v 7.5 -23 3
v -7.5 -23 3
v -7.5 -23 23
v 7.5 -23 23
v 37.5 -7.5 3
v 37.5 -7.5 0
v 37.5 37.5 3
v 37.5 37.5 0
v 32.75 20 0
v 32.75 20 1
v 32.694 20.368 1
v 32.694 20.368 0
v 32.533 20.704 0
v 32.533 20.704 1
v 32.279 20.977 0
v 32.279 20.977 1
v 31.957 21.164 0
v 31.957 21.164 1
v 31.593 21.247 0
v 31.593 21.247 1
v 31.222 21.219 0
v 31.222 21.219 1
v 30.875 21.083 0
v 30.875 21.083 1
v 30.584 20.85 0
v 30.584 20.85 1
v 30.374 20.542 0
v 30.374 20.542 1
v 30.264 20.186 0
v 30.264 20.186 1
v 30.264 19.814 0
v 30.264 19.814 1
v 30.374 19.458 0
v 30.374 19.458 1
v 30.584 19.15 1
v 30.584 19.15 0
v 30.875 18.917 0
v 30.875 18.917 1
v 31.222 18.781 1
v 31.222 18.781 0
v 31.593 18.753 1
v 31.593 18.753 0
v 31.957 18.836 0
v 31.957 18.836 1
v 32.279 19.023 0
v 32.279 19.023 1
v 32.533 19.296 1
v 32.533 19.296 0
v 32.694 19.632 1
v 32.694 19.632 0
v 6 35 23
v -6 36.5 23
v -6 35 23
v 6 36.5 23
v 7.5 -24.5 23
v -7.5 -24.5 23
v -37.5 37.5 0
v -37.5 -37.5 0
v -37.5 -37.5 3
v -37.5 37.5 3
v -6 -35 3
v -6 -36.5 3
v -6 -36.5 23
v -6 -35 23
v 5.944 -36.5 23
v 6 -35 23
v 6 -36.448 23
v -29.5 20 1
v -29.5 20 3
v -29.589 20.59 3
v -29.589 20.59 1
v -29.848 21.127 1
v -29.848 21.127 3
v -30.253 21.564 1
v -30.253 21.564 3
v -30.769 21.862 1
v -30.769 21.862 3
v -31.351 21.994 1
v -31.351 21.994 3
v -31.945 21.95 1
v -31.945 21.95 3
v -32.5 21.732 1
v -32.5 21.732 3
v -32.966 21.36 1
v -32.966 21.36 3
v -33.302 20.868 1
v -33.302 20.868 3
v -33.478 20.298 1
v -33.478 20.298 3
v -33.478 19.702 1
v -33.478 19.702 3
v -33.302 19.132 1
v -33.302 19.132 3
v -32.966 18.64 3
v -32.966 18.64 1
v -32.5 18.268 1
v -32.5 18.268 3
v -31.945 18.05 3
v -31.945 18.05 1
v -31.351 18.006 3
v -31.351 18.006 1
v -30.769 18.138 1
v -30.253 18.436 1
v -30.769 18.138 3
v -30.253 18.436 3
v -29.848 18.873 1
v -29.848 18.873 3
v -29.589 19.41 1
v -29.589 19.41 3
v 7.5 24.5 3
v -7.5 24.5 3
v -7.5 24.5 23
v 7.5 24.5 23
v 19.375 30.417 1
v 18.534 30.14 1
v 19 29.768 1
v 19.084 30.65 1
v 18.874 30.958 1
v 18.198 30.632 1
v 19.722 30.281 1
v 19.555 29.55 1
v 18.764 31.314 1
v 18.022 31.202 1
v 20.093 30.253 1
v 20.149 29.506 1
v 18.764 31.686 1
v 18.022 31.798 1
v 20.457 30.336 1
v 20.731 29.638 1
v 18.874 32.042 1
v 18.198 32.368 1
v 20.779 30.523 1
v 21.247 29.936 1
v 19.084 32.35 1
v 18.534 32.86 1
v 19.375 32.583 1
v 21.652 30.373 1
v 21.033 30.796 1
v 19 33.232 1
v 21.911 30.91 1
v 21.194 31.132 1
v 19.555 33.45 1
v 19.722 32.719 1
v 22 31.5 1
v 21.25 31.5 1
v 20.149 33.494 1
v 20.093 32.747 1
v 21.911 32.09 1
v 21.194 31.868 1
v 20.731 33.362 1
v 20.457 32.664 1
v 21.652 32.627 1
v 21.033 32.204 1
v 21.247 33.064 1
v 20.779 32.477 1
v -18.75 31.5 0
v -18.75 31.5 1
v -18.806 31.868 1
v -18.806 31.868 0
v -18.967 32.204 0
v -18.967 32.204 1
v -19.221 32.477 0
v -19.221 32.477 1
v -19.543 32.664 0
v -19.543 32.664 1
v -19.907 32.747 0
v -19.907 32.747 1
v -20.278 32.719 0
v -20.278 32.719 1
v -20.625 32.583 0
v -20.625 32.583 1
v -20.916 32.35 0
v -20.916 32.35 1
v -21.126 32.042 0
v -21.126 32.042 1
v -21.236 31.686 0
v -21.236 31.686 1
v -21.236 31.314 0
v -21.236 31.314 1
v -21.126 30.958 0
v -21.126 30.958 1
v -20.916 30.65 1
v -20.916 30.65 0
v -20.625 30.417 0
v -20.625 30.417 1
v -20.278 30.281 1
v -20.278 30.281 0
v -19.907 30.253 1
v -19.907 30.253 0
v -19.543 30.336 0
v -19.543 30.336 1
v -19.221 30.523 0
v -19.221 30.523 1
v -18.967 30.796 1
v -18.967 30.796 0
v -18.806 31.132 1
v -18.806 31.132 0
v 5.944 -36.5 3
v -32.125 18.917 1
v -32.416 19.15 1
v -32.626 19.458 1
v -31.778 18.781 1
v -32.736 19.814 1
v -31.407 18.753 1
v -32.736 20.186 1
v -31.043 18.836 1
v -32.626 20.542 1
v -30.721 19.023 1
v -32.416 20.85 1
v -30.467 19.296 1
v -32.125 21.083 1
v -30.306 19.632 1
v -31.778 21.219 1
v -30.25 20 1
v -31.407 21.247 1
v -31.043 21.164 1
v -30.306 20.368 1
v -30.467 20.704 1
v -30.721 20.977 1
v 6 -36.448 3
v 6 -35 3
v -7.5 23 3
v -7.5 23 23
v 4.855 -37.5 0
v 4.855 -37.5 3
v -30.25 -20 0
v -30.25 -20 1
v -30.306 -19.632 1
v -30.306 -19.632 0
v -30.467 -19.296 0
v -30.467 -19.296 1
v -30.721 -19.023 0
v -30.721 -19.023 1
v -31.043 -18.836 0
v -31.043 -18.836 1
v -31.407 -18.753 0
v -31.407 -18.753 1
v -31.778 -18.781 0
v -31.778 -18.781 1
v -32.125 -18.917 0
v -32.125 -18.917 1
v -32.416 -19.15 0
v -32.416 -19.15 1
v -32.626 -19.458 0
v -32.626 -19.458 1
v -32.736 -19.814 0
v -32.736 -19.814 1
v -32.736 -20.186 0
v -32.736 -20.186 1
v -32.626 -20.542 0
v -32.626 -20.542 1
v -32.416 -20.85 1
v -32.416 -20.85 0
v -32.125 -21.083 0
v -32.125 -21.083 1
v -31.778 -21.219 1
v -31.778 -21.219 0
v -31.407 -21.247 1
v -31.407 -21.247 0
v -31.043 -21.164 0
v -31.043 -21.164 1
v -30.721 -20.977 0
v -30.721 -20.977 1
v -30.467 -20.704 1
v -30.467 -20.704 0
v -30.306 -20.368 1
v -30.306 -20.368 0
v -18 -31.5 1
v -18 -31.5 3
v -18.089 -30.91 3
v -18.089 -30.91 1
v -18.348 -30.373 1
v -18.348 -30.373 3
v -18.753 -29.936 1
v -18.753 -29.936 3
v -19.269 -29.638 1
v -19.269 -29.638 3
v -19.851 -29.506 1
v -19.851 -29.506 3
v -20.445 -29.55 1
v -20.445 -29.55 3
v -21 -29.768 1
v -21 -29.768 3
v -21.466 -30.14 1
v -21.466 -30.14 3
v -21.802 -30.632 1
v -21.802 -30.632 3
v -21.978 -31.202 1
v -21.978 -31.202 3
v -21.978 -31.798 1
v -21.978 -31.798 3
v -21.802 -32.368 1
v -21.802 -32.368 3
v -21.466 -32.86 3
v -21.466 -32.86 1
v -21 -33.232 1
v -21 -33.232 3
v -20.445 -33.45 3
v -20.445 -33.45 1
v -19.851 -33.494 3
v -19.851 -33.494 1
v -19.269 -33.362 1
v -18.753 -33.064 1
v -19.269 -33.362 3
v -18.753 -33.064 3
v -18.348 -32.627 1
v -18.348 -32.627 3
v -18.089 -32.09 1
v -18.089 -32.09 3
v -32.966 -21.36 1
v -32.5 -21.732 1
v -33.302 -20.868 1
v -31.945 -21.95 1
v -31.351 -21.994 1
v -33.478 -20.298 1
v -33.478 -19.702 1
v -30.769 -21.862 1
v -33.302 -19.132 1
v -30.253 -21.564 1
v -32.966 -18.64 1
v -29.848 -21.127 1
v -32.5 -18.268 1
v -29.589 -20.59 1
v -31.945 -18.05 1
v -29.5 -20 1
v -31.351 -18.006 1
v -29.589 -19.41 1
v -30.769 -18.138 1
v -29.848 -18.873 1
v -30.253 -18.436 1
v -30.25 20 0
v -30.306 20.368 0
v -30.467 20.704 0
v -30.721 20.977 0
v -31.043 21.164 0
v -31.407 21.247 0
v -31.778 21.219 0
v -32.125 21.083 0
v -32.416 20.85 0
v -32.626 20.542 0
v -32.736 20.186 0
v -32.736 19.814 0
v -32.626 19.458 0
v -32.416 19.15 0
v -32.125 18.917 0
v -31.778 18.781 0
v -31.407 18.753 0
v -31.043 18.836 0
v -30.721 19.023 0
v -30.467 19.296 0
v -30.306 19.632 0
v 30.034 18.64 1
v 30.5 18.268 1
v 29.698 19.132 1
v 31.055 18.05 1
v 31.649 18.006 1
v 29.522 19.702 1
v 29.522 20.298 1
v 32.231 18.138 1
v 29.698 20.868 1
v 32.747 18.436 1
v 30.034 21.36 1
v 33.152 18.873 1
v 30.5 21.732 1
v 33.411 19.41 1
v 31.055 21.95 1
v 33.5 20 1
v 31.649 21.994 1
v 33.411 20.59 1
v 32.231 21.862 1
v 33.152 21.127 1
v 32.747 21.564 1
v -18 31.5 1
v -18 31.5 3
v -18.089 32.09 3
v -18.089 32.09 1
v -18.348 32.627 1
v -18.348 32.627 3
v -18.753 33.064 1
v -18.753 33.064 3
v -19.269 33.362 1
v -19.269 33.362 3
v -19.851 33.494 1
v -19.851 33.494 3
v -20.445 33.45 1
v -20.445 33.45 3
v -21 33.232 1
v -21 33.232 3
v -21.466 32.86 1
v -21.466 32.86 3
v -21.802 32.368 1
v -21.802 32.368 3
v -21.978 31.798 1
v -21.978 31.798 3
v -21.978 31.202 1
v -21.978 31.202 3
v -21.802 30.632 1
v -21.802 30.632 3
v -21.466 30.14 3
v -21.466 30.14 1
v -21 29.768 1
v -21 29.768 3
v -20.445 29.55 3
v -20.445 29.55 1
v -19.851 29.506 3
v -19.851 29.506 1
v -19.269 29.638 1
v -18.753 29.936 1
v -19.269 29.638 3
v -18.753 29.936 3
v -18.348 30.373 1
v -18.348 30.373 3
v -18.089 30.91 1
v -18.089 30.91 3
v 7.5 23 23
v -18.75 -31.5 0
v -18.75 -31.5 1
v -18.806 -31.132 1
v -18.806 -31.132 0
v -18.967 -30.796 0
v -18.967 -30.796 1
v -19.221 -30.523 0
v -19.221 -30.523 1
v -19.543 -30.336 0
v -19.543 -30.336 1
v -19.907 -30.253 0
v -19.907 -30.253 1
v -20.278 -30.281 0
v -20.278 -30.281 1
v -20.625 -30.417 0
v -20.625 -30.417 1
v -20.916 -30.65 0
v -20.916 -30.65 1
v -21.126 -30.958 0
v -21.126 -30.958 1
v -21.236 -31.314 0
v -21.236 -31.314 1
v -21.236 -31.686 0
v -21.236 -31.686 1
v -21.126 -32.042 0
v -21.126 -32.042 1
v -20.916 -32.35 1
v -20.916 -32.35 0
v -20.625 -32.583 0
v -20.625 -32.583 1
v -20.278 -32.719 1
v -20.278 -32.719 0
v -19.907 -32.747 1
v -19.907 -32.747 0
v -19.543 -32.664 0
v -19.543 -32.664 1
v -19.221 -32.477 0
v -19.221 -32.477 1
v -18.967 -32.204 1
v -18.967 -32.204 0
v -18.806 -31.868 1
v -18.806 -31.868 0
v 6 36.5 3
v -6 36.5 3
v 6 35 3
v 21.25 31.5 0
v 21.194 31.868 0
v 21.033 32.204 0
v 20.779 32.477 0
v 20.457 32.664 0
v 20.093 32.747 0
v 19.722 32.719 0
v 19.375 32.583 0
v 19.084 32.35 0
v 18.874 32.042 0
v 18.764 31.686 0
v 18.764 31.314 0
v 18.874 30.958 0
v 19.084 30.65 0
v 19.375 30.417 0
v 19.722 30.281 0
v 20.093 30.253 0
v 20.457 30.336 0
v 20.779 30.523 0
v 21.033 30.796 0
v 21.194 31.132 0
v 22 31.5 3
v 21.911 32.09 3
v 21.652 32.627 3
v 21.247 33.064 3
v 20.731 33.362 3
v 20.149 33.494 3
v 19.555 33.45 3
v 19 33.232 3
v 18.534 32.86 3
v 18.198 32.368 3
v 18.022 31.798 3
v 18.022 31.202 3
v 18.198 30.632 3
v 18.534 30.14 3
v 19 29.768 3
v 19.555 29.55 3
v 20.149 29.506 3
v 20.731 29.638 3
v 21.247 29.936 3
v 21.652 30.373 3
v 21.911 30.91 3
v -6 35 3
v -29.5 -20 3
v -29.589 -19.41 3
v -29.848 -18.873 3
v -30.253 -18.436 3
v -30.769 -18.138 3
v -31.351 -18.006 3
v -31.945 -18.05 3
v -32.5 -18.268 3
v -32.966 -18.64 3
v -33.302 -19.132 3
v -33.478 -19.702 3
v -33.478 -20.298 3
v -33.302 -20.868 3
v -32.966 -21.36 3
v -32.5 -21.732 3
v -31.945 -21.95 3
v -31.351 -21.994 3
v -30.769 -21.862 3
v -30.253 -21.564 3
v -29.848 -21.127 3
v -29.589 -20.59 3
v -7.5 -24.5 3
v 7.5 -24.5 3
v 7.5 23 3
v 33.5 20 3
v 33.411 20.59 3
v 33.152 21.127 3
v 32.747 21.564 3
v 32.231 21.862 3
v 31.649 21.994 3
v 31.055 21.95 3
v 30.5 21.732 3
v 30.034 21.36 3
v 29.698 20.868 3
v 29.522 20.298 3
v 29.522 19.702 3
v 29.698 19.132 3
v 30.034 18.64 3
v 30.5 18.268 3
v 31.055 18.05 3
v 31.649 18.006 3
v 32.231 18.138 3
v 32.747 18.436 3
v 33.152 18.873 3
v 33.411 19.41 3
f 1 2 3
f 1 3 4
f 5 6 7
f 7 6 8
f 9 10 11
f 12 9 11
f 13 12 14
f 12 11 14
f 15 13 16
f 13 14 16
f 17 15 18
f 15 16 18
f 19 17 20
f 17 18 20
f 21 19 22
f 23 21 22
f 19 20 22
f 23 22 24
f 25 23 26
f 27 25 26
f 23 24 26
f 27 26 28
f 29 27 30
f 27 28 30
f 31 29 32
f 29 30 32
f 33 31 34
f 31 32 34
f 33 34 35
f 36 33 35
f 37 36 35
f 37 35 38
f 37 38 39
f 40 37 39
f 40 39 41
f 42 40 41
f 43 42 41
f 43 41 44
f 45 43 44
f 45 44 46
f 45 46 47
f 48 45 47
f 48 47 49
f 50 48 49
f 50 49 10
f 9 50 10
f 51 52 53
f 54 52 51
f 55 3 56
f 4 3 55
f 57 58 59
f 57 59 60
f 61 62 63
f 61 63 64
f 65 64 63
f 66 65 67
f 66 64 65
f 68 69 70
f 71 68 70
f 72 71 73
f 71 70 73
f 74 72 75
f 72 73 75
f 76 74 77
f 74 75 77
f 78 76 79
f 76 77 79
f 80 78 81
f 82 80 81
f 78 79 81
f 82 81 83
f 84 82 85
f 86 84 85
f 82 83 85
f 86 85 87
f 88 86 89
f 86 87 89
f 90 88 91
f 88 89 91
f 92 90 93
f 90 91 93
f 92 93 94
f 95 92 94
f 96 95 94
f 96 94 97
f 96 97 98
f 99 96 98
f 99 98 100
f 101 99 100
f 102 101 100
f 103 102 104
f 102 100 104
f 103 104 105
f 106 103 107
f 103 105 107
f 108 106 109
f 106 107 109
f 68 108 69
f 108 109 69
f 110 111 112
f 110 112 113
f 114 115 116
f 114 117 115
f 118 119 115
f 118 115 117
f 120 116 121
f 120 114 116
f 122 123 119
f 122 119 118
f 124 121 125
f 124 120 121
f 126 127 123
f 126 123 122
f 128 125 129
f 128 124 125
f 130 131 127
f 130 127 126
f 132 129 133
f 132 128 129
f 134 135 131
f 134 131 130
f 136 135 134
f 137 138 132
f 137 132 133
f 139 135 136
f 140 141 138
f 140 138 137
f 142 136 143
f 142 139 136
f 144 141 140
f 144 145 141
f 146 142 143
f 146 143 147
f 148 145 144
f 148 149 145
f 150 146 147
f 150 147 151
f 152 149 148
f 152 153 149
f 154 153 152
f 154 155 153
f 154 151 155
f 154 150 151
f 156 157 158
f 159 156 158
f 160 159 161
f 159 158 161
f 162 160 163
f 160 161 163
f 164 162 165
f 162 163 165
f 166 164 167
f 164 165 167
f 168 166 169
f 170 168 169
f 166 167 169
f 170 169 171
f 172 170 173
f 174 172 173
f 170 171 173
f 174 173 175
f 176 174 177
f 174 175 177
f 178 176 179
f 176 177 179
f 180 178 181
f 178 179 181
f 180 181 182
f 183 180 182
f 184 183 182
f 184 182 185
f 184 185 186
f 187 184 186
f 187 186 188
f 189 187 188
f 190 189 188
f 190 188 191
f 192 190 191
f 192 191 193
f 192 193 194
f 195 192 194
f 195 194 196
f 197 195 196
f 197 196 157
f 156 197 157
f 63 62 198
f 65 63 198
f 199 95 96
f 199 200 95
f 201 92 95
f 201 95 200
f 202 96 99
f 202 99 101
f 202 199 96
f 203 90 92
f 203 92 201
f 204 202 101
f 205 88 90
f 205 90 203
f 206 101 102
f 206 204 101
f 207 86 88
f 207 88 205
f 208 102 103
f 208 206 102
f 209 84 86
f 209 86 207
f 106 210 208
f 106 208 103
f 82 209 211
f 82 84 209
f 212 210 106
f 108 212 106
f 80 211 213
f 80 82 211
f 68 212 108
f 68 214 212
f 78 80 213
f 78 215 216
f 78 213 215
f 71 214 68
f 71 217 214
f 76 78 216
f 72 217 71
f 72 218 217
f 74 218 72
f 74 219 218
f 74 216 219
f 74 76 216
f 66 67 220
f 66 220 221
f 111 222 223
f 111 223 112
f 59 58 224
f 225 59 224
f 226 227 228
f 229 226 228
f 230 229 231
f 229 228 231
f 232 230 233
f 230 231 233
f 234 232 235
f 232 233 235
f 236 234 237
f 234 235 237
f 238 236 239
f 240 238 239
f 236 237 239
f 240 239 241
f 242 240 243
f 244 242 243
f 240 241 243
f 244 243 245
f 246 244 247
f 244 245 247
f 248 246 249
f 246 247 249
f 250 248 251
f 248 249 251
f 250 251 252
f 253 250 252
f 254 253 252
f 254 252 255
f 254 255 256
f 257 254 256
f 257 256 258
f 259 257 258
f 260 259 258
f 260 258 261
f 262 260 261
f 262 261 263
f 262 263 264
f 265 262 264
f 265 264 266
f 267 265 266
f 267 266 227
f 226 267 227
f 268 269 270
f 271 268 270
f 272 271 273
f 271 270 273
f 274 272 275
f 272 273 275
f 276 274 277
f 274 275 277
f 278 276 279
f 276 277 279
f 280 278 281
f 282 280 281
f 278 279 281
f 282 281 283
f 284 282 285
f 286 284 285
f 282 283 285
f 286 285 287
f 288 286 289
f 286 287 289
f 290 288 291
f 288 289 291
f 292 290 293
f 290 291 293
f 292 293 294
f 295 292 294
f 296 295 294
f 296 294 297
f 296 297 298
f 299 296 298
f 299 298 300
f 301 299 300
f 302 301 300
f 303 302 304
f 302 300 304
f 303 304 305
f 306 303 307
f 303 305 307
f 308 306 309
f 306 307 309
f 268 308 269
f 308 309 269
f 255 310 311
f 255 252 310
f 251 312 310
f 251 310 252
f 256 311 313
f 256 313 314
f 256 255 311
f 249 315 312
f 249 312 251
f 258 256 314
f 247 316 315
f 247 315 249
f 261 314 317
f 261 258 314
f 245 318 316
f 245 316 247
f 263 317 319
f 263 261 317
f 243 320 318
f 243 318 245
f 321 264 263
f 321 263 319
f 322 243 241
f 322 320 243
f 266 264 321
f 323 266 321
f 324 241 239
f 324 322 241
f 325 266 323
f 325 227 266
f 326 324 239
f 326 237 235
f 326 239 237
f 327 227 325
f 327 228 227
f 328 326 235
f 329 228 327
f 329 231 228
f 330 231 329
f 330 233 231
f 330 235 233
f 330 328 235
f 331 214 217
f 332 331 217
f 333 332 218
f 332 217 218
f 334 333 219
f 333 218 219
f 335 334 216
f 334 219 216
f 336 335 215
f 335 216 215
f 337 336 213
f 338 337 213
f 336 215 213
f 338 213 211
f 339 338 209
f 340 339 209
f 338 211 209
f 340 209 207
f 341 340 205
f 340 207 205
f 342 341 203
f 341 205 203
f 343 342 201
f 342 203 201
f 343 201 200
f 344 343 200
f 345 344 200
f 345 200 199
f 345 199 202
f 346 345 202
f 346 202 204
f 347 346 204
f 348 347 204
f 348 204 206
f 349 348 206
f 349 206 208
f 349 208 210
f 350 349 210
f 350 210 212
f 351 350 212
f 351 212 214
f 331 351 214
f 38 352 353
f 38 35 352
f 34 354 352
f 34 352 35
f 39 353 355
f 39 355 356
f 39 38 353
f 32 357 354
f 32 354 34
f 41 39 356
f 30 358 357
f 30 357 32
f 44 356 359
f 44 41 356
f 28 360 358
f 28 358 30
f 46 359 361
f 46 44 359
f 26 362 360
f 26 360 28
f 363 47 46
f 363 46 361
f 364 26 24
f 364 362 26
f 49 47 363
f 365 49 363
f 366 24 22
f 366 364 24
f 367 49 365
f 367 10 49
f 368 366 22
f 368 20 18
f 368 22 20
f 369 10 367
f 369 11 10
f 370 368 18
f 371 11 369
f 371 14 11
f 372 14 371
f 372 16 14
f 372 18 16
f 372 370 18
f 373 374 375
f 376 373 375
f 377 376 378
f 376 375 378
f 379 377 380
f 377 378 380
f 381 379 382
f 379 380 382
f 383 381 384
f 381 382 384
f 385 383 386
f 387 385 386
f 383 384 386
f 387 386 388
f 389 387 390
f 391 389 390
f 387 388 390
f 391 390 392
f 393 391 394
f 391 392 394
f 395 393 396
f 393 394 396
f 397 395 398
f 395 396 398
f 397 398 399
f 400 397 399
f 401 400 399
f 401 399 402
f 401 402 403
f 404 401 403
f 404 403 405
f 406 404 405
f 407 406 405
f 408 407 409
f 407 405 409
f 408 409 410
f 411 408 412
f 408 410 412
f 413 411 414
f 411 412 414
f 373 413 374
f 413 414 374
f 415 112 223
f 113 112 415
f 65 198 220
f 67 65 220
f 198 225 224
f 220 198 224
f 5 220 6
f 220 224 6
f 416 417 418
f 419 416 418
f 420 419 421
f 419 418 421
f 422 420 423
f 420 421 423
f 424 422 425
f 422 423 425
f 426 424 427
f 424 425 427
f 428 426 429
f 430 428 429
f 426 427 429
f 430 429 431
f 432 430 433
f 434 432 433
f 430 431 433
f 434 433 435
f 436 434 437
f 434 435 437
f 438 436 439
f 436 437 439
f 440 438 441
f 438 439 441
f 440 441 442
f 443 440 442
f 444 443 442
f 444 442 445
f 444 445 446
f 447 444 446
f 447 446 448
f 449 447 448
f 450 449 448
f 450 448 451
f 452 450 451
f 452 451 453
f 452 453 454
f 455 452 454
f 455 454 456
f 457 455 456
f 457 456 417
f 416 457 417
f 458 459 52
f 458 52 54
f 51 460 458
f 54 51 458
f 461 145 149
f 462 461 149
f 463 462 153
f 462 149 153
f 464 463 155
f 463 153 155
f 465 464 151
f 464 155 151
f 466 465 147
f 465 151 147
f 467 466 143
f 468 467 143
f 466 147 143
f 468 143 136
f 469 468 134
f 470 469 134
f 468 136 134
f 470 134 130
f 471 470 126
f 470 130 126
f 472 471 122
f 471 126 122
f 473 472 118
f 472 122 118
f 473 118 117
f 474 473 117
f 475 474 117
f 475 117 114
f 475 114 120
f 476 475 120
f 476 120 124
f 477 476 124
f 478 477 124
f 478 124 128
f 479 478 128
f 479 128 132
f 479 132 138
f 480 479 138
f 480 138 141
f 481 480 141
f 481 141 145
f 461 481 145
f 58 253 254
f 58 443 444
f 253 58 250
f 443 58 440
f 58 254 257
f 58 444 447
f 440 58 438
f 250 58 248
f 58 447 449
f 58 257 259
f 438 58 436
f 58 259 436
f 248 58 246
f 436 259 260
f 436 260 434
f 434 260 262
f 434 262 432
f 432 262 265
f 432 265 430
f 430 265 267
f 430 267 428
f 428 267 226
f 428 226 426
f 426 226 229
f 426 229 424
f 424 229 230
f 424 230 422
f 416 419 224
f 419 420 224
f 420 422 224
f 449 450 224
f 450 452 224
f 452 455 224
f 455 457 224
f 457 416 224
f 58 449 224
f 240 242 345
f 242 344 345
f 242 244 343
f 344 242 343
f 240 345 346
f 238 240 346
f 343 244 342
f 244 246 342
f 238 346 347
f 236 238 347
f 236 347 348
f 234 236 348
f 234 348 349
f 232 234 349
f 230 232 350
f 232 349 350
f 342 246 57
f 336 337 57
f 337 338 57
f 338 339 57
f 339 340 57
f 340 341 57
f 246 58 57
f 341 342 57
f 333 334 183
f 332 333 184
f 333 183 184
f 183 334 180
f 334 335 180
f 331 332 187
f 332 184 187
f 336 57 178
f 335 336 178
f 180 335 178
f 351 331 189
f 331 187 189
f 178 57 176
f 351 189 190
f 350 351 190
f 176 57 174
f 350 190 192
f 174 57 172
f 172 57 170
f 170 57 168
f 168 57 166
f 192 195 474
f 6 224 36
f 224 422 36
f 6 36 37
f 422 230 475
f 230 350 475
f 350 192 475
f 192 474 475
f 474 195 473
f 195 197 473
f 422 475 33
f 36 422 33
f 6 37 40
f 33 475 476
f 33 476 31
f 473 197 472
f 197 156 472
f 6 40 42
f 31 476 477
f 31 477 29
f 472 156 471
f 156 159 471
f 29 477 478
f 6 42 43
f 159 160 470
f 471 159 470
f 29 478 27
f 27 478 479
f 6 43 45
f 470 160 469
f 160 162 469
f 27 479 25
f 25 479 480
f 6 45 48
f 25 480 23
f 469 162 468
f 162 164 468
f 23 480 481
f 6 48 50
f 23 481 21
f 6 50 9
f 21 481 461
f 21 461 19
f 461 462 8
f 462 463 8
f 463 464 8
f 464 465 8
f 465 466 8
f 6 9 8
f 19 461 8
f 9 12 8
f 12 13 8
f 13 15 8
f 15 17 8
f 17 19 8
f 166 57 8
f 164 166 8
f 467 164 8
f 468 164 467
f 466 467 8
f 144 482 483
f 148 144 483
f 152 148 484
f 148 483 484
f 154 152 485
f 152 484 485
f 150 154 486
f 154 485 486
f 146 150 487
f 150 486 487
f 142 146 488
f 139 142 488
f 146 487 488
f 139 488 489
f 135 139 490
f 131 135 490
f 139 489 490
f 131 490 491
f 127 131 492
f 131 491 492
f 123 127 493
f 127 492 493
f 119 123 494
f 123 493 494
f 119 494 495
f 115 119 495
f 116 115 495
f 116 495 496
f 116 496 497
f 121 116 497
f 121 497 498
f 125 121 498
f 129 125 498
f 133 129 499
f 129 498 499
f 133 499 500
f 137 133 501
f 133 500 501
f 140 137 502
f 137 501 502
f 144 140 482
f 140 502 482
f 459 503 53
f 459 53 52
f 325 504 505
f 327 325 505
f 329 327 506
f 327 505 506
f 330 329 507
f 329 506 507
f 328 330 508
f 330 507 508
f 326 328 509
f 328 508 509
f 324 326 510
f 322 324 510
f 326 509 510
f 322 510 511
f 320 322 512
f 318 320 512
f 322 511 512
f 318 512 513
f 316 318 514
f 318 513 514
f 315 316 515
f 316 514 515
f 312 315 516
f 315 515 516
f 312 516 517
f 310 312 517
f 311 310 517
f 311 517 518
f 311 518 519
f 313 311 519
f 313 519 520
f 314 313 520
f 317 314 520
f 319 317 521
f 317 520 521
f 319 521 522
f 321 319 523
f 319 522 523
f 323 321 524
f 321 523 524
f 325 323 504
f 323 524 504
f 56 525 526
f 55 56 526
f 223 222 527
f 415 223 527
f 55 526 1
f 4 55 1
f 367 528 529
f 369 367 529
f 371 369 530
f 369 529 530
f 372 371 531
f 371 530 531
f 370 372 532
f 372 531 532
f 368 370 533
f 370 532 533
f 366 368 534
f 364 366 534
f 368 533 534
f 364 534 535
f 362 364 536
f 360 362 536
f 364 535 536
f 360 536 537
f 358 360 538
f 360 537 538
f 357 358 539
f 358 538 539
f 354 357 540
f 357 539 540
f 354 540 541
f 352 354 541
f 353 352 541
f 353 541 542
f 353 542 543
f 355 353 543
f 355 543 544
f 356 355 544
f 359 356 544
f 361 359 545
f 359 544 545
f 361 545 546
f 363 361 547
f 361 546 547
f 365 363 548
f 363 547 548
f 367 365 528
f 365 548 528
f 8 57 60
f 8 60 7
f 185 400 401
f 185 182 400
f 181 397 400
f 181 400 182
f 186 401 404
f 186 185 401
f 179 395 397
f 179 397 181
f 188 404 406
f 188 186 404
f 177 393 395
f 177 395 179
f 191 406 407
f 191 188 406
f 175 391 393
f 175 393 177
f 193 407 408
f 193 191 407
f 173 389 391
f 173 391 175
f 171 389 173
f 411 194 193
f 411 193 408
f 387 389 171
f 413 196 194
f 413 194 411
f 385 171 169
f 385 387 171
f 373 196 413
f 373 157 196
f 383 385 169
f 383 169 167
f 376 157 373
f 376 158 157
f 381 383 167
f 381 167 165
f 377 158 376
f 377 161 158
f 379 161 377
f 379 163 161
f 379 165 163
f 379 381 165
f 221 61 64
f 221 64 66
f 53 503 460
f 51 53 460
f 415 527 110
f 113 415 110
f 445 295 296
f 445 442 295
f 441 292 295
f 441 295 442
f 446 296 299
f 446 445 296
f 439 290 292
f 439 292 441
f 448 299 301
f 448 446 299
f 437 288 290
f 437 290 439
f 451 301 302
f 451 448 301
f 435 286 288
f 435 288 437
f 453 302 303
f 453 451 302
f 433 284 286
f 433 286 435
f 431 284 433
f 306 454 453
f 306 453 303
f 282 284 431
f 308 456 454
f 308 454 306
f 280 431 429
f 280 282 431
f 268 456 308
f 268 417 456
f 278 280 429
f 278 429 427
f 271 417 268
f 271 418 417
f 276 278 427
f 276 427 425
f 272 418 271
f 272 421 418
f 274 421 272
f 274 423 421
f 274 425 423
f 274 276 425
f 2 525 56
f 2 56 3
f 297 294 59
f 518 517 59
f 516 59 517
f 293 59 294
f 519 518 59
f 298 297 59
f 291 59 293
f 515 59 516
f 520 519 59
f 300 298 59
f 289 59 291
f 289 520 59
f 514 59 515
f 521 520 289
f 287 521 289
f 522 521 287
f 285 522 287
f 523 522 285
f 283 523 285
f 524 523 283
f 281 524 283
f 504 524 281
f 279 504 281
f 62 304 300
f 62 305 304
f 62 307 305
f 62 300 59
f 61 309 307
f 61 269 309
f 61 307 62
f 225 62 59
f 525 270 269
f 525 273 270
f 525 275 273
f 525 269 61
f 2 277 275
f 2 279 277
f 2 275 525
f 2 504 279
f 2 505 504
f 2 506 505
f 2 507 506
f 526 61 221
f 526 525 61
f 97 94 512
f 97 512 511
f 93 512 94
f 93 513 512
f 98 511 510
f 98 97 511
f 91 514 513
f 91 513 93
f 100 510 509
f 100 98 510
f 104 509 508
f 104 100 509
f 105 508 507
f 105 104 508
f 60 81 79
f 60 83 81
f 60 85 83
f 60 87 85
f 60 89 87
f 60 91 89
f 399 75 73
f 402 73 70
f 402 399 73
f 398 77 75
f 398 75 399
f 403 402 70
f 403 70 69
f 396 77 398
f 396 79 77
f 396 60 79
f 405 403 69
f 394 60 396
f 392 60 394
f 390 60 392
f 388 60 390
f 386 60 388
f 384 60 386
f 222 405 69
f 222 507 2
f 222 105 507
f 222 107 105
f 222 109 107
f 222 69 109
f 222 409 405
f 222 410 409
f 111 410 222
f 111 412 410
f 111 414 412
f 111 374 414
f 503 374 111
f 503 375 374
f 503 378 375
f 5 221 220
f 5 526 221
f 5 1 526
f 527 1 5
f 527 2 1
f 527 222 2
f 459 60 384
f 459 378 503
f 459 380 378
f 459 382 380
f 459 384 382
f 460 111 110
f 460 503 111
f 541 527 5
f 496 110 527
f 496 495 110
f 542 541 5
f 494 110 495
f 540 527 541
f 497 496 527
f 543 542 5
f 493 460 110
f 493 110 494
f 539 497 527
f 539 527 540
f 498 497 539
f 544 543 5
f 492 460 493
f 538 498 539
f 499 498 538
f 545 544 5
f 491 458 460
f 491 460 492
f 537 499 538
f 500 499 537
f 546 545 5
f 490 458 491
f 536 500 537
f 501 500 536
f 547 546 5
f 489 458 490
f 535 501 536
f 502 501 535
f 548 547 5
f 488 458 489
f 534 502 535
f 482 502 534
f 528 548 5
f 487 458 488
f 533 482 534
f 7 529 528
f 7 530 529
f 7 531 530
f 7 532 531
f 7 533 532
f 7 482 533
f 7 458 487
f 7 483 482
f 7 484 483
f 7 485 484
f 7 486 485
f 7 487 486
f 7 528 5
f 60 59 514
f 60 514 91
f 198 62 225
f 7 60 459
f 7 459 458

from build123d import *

# Parameters (mm, degrees)
F0_W      = 75
F0_H      = 75
F1_DEPTH  = 3
F2_R      = 2
F3_DEPTH  = 2
F4_R      = 1.25
F5_DEPTH  = 1.001
F6_W      = 15
F6_H      = 1.5
F7_DEPTH  = 20
F8_W      = 12
F8_H      = 1.5
F9_DEPTH  = 20
F10_R     = 1.25
F11_DEPTH = 23.001


with BuildPart() as f1:
    # F0 (on Top) → F1 (new body)
    with BuildSketch(Plane.XY):
        Rectangle(F0_W, F0_H)
    extrude(amount=F1_DEPTH)

    # F2 (on face) → F3 (cut)
    with BuildSketch(Plane.XY.offset(3)):
        with Locations((31.5, -20)):
            Circle(F2_R)
        with Locations((20, -31.5)):
            Circle(F2_R)
        with Locations((31.5, 20)):
            Circle(F2_R)
        with Locations((20, 31.5)):
            Circle(F2_R)
        with Locations((-20, 31.5)):
            Circle(F2_R)
        with Locations((-31.5, 20)):
            Circle(F2_R)
        with Locations((-20, -31.5)):
            Circle(F2_R)
        with Locations((-31.5, -20)):
            Circle(F2_R)
    extrude(amount=-F3_DEPTH, mode=Mode.SUBTRACT)

    # F4 (on face) → F5 (cut, through all)
    with BuildSketch(Plane.XY.offset(1)):
        with Locations((-31.5, 20)):
            Circle(F4_R)
        with Locations((-20, 31.5)):
            Circle(F4_R)
        with Locations((20, 31.5)):
            Circle(F4_R)
        with Locations((31.5, 20)):
            Circle(F4_R)
        with Locations((-31.5, -20)):
            Circle(F4_R)
        with Locations((31.5, -20)):
            Circle(F4_R)
        with Locations((20, -31.5)):
            Circle(F4_R)
        with Locations((-20, -31.5)):
            Circle(F4_R)
    extrude(amount=-F5_DEPTH, mode=Mode.SUBTRACT)

    # F6 (on face) → F7 (join)
    with BuildSketch(Plane.XY.offset(3)):
        with Locations((0, -23.75)):
            Rectangle(F6_W, F6_H)
        with Locations((0, 23.75)):
            Rectangle(F6_W, F6_H)
    extrude(amount=F7_DEPTH)

    # F8 (on face) → F9 (join)
    with BuildSketch(Plane.XY.offset(3)):
        with Locations((0, -35.75)):
            Rectangle(F8_W, F8_H)
        with Locations((0, 35.75)):
            Rectangle(F8_W, F8_H)
    extrude(amount=F9_DEPTH)

    # F10 (on face) → F11 (cut, through all)
    with BuildSketch(Plane(origin=(0, 0, 0), x_dir=(1, 0, 0), z_dir=(0, 0, -1))):
        Polygon((37.5, 37.5), (4.855387, 37.5), (37.5, 7.5), align=None)
        Polygon((37.5, 37.5), (4.855387, 37.5), (37.5, 7.5), align=None)
        with Locations((31.5, 20)):
            Circle(F10_R, mode=Mode.SUBTRACT)
        with Locations((20, 31.5)):
            Circle(F10_R, mode=Mode.SUBTRACT)
    extrude(amount=-F11_DEPTH, mode=Mode.SUBTRACT)


solid = f1.part
